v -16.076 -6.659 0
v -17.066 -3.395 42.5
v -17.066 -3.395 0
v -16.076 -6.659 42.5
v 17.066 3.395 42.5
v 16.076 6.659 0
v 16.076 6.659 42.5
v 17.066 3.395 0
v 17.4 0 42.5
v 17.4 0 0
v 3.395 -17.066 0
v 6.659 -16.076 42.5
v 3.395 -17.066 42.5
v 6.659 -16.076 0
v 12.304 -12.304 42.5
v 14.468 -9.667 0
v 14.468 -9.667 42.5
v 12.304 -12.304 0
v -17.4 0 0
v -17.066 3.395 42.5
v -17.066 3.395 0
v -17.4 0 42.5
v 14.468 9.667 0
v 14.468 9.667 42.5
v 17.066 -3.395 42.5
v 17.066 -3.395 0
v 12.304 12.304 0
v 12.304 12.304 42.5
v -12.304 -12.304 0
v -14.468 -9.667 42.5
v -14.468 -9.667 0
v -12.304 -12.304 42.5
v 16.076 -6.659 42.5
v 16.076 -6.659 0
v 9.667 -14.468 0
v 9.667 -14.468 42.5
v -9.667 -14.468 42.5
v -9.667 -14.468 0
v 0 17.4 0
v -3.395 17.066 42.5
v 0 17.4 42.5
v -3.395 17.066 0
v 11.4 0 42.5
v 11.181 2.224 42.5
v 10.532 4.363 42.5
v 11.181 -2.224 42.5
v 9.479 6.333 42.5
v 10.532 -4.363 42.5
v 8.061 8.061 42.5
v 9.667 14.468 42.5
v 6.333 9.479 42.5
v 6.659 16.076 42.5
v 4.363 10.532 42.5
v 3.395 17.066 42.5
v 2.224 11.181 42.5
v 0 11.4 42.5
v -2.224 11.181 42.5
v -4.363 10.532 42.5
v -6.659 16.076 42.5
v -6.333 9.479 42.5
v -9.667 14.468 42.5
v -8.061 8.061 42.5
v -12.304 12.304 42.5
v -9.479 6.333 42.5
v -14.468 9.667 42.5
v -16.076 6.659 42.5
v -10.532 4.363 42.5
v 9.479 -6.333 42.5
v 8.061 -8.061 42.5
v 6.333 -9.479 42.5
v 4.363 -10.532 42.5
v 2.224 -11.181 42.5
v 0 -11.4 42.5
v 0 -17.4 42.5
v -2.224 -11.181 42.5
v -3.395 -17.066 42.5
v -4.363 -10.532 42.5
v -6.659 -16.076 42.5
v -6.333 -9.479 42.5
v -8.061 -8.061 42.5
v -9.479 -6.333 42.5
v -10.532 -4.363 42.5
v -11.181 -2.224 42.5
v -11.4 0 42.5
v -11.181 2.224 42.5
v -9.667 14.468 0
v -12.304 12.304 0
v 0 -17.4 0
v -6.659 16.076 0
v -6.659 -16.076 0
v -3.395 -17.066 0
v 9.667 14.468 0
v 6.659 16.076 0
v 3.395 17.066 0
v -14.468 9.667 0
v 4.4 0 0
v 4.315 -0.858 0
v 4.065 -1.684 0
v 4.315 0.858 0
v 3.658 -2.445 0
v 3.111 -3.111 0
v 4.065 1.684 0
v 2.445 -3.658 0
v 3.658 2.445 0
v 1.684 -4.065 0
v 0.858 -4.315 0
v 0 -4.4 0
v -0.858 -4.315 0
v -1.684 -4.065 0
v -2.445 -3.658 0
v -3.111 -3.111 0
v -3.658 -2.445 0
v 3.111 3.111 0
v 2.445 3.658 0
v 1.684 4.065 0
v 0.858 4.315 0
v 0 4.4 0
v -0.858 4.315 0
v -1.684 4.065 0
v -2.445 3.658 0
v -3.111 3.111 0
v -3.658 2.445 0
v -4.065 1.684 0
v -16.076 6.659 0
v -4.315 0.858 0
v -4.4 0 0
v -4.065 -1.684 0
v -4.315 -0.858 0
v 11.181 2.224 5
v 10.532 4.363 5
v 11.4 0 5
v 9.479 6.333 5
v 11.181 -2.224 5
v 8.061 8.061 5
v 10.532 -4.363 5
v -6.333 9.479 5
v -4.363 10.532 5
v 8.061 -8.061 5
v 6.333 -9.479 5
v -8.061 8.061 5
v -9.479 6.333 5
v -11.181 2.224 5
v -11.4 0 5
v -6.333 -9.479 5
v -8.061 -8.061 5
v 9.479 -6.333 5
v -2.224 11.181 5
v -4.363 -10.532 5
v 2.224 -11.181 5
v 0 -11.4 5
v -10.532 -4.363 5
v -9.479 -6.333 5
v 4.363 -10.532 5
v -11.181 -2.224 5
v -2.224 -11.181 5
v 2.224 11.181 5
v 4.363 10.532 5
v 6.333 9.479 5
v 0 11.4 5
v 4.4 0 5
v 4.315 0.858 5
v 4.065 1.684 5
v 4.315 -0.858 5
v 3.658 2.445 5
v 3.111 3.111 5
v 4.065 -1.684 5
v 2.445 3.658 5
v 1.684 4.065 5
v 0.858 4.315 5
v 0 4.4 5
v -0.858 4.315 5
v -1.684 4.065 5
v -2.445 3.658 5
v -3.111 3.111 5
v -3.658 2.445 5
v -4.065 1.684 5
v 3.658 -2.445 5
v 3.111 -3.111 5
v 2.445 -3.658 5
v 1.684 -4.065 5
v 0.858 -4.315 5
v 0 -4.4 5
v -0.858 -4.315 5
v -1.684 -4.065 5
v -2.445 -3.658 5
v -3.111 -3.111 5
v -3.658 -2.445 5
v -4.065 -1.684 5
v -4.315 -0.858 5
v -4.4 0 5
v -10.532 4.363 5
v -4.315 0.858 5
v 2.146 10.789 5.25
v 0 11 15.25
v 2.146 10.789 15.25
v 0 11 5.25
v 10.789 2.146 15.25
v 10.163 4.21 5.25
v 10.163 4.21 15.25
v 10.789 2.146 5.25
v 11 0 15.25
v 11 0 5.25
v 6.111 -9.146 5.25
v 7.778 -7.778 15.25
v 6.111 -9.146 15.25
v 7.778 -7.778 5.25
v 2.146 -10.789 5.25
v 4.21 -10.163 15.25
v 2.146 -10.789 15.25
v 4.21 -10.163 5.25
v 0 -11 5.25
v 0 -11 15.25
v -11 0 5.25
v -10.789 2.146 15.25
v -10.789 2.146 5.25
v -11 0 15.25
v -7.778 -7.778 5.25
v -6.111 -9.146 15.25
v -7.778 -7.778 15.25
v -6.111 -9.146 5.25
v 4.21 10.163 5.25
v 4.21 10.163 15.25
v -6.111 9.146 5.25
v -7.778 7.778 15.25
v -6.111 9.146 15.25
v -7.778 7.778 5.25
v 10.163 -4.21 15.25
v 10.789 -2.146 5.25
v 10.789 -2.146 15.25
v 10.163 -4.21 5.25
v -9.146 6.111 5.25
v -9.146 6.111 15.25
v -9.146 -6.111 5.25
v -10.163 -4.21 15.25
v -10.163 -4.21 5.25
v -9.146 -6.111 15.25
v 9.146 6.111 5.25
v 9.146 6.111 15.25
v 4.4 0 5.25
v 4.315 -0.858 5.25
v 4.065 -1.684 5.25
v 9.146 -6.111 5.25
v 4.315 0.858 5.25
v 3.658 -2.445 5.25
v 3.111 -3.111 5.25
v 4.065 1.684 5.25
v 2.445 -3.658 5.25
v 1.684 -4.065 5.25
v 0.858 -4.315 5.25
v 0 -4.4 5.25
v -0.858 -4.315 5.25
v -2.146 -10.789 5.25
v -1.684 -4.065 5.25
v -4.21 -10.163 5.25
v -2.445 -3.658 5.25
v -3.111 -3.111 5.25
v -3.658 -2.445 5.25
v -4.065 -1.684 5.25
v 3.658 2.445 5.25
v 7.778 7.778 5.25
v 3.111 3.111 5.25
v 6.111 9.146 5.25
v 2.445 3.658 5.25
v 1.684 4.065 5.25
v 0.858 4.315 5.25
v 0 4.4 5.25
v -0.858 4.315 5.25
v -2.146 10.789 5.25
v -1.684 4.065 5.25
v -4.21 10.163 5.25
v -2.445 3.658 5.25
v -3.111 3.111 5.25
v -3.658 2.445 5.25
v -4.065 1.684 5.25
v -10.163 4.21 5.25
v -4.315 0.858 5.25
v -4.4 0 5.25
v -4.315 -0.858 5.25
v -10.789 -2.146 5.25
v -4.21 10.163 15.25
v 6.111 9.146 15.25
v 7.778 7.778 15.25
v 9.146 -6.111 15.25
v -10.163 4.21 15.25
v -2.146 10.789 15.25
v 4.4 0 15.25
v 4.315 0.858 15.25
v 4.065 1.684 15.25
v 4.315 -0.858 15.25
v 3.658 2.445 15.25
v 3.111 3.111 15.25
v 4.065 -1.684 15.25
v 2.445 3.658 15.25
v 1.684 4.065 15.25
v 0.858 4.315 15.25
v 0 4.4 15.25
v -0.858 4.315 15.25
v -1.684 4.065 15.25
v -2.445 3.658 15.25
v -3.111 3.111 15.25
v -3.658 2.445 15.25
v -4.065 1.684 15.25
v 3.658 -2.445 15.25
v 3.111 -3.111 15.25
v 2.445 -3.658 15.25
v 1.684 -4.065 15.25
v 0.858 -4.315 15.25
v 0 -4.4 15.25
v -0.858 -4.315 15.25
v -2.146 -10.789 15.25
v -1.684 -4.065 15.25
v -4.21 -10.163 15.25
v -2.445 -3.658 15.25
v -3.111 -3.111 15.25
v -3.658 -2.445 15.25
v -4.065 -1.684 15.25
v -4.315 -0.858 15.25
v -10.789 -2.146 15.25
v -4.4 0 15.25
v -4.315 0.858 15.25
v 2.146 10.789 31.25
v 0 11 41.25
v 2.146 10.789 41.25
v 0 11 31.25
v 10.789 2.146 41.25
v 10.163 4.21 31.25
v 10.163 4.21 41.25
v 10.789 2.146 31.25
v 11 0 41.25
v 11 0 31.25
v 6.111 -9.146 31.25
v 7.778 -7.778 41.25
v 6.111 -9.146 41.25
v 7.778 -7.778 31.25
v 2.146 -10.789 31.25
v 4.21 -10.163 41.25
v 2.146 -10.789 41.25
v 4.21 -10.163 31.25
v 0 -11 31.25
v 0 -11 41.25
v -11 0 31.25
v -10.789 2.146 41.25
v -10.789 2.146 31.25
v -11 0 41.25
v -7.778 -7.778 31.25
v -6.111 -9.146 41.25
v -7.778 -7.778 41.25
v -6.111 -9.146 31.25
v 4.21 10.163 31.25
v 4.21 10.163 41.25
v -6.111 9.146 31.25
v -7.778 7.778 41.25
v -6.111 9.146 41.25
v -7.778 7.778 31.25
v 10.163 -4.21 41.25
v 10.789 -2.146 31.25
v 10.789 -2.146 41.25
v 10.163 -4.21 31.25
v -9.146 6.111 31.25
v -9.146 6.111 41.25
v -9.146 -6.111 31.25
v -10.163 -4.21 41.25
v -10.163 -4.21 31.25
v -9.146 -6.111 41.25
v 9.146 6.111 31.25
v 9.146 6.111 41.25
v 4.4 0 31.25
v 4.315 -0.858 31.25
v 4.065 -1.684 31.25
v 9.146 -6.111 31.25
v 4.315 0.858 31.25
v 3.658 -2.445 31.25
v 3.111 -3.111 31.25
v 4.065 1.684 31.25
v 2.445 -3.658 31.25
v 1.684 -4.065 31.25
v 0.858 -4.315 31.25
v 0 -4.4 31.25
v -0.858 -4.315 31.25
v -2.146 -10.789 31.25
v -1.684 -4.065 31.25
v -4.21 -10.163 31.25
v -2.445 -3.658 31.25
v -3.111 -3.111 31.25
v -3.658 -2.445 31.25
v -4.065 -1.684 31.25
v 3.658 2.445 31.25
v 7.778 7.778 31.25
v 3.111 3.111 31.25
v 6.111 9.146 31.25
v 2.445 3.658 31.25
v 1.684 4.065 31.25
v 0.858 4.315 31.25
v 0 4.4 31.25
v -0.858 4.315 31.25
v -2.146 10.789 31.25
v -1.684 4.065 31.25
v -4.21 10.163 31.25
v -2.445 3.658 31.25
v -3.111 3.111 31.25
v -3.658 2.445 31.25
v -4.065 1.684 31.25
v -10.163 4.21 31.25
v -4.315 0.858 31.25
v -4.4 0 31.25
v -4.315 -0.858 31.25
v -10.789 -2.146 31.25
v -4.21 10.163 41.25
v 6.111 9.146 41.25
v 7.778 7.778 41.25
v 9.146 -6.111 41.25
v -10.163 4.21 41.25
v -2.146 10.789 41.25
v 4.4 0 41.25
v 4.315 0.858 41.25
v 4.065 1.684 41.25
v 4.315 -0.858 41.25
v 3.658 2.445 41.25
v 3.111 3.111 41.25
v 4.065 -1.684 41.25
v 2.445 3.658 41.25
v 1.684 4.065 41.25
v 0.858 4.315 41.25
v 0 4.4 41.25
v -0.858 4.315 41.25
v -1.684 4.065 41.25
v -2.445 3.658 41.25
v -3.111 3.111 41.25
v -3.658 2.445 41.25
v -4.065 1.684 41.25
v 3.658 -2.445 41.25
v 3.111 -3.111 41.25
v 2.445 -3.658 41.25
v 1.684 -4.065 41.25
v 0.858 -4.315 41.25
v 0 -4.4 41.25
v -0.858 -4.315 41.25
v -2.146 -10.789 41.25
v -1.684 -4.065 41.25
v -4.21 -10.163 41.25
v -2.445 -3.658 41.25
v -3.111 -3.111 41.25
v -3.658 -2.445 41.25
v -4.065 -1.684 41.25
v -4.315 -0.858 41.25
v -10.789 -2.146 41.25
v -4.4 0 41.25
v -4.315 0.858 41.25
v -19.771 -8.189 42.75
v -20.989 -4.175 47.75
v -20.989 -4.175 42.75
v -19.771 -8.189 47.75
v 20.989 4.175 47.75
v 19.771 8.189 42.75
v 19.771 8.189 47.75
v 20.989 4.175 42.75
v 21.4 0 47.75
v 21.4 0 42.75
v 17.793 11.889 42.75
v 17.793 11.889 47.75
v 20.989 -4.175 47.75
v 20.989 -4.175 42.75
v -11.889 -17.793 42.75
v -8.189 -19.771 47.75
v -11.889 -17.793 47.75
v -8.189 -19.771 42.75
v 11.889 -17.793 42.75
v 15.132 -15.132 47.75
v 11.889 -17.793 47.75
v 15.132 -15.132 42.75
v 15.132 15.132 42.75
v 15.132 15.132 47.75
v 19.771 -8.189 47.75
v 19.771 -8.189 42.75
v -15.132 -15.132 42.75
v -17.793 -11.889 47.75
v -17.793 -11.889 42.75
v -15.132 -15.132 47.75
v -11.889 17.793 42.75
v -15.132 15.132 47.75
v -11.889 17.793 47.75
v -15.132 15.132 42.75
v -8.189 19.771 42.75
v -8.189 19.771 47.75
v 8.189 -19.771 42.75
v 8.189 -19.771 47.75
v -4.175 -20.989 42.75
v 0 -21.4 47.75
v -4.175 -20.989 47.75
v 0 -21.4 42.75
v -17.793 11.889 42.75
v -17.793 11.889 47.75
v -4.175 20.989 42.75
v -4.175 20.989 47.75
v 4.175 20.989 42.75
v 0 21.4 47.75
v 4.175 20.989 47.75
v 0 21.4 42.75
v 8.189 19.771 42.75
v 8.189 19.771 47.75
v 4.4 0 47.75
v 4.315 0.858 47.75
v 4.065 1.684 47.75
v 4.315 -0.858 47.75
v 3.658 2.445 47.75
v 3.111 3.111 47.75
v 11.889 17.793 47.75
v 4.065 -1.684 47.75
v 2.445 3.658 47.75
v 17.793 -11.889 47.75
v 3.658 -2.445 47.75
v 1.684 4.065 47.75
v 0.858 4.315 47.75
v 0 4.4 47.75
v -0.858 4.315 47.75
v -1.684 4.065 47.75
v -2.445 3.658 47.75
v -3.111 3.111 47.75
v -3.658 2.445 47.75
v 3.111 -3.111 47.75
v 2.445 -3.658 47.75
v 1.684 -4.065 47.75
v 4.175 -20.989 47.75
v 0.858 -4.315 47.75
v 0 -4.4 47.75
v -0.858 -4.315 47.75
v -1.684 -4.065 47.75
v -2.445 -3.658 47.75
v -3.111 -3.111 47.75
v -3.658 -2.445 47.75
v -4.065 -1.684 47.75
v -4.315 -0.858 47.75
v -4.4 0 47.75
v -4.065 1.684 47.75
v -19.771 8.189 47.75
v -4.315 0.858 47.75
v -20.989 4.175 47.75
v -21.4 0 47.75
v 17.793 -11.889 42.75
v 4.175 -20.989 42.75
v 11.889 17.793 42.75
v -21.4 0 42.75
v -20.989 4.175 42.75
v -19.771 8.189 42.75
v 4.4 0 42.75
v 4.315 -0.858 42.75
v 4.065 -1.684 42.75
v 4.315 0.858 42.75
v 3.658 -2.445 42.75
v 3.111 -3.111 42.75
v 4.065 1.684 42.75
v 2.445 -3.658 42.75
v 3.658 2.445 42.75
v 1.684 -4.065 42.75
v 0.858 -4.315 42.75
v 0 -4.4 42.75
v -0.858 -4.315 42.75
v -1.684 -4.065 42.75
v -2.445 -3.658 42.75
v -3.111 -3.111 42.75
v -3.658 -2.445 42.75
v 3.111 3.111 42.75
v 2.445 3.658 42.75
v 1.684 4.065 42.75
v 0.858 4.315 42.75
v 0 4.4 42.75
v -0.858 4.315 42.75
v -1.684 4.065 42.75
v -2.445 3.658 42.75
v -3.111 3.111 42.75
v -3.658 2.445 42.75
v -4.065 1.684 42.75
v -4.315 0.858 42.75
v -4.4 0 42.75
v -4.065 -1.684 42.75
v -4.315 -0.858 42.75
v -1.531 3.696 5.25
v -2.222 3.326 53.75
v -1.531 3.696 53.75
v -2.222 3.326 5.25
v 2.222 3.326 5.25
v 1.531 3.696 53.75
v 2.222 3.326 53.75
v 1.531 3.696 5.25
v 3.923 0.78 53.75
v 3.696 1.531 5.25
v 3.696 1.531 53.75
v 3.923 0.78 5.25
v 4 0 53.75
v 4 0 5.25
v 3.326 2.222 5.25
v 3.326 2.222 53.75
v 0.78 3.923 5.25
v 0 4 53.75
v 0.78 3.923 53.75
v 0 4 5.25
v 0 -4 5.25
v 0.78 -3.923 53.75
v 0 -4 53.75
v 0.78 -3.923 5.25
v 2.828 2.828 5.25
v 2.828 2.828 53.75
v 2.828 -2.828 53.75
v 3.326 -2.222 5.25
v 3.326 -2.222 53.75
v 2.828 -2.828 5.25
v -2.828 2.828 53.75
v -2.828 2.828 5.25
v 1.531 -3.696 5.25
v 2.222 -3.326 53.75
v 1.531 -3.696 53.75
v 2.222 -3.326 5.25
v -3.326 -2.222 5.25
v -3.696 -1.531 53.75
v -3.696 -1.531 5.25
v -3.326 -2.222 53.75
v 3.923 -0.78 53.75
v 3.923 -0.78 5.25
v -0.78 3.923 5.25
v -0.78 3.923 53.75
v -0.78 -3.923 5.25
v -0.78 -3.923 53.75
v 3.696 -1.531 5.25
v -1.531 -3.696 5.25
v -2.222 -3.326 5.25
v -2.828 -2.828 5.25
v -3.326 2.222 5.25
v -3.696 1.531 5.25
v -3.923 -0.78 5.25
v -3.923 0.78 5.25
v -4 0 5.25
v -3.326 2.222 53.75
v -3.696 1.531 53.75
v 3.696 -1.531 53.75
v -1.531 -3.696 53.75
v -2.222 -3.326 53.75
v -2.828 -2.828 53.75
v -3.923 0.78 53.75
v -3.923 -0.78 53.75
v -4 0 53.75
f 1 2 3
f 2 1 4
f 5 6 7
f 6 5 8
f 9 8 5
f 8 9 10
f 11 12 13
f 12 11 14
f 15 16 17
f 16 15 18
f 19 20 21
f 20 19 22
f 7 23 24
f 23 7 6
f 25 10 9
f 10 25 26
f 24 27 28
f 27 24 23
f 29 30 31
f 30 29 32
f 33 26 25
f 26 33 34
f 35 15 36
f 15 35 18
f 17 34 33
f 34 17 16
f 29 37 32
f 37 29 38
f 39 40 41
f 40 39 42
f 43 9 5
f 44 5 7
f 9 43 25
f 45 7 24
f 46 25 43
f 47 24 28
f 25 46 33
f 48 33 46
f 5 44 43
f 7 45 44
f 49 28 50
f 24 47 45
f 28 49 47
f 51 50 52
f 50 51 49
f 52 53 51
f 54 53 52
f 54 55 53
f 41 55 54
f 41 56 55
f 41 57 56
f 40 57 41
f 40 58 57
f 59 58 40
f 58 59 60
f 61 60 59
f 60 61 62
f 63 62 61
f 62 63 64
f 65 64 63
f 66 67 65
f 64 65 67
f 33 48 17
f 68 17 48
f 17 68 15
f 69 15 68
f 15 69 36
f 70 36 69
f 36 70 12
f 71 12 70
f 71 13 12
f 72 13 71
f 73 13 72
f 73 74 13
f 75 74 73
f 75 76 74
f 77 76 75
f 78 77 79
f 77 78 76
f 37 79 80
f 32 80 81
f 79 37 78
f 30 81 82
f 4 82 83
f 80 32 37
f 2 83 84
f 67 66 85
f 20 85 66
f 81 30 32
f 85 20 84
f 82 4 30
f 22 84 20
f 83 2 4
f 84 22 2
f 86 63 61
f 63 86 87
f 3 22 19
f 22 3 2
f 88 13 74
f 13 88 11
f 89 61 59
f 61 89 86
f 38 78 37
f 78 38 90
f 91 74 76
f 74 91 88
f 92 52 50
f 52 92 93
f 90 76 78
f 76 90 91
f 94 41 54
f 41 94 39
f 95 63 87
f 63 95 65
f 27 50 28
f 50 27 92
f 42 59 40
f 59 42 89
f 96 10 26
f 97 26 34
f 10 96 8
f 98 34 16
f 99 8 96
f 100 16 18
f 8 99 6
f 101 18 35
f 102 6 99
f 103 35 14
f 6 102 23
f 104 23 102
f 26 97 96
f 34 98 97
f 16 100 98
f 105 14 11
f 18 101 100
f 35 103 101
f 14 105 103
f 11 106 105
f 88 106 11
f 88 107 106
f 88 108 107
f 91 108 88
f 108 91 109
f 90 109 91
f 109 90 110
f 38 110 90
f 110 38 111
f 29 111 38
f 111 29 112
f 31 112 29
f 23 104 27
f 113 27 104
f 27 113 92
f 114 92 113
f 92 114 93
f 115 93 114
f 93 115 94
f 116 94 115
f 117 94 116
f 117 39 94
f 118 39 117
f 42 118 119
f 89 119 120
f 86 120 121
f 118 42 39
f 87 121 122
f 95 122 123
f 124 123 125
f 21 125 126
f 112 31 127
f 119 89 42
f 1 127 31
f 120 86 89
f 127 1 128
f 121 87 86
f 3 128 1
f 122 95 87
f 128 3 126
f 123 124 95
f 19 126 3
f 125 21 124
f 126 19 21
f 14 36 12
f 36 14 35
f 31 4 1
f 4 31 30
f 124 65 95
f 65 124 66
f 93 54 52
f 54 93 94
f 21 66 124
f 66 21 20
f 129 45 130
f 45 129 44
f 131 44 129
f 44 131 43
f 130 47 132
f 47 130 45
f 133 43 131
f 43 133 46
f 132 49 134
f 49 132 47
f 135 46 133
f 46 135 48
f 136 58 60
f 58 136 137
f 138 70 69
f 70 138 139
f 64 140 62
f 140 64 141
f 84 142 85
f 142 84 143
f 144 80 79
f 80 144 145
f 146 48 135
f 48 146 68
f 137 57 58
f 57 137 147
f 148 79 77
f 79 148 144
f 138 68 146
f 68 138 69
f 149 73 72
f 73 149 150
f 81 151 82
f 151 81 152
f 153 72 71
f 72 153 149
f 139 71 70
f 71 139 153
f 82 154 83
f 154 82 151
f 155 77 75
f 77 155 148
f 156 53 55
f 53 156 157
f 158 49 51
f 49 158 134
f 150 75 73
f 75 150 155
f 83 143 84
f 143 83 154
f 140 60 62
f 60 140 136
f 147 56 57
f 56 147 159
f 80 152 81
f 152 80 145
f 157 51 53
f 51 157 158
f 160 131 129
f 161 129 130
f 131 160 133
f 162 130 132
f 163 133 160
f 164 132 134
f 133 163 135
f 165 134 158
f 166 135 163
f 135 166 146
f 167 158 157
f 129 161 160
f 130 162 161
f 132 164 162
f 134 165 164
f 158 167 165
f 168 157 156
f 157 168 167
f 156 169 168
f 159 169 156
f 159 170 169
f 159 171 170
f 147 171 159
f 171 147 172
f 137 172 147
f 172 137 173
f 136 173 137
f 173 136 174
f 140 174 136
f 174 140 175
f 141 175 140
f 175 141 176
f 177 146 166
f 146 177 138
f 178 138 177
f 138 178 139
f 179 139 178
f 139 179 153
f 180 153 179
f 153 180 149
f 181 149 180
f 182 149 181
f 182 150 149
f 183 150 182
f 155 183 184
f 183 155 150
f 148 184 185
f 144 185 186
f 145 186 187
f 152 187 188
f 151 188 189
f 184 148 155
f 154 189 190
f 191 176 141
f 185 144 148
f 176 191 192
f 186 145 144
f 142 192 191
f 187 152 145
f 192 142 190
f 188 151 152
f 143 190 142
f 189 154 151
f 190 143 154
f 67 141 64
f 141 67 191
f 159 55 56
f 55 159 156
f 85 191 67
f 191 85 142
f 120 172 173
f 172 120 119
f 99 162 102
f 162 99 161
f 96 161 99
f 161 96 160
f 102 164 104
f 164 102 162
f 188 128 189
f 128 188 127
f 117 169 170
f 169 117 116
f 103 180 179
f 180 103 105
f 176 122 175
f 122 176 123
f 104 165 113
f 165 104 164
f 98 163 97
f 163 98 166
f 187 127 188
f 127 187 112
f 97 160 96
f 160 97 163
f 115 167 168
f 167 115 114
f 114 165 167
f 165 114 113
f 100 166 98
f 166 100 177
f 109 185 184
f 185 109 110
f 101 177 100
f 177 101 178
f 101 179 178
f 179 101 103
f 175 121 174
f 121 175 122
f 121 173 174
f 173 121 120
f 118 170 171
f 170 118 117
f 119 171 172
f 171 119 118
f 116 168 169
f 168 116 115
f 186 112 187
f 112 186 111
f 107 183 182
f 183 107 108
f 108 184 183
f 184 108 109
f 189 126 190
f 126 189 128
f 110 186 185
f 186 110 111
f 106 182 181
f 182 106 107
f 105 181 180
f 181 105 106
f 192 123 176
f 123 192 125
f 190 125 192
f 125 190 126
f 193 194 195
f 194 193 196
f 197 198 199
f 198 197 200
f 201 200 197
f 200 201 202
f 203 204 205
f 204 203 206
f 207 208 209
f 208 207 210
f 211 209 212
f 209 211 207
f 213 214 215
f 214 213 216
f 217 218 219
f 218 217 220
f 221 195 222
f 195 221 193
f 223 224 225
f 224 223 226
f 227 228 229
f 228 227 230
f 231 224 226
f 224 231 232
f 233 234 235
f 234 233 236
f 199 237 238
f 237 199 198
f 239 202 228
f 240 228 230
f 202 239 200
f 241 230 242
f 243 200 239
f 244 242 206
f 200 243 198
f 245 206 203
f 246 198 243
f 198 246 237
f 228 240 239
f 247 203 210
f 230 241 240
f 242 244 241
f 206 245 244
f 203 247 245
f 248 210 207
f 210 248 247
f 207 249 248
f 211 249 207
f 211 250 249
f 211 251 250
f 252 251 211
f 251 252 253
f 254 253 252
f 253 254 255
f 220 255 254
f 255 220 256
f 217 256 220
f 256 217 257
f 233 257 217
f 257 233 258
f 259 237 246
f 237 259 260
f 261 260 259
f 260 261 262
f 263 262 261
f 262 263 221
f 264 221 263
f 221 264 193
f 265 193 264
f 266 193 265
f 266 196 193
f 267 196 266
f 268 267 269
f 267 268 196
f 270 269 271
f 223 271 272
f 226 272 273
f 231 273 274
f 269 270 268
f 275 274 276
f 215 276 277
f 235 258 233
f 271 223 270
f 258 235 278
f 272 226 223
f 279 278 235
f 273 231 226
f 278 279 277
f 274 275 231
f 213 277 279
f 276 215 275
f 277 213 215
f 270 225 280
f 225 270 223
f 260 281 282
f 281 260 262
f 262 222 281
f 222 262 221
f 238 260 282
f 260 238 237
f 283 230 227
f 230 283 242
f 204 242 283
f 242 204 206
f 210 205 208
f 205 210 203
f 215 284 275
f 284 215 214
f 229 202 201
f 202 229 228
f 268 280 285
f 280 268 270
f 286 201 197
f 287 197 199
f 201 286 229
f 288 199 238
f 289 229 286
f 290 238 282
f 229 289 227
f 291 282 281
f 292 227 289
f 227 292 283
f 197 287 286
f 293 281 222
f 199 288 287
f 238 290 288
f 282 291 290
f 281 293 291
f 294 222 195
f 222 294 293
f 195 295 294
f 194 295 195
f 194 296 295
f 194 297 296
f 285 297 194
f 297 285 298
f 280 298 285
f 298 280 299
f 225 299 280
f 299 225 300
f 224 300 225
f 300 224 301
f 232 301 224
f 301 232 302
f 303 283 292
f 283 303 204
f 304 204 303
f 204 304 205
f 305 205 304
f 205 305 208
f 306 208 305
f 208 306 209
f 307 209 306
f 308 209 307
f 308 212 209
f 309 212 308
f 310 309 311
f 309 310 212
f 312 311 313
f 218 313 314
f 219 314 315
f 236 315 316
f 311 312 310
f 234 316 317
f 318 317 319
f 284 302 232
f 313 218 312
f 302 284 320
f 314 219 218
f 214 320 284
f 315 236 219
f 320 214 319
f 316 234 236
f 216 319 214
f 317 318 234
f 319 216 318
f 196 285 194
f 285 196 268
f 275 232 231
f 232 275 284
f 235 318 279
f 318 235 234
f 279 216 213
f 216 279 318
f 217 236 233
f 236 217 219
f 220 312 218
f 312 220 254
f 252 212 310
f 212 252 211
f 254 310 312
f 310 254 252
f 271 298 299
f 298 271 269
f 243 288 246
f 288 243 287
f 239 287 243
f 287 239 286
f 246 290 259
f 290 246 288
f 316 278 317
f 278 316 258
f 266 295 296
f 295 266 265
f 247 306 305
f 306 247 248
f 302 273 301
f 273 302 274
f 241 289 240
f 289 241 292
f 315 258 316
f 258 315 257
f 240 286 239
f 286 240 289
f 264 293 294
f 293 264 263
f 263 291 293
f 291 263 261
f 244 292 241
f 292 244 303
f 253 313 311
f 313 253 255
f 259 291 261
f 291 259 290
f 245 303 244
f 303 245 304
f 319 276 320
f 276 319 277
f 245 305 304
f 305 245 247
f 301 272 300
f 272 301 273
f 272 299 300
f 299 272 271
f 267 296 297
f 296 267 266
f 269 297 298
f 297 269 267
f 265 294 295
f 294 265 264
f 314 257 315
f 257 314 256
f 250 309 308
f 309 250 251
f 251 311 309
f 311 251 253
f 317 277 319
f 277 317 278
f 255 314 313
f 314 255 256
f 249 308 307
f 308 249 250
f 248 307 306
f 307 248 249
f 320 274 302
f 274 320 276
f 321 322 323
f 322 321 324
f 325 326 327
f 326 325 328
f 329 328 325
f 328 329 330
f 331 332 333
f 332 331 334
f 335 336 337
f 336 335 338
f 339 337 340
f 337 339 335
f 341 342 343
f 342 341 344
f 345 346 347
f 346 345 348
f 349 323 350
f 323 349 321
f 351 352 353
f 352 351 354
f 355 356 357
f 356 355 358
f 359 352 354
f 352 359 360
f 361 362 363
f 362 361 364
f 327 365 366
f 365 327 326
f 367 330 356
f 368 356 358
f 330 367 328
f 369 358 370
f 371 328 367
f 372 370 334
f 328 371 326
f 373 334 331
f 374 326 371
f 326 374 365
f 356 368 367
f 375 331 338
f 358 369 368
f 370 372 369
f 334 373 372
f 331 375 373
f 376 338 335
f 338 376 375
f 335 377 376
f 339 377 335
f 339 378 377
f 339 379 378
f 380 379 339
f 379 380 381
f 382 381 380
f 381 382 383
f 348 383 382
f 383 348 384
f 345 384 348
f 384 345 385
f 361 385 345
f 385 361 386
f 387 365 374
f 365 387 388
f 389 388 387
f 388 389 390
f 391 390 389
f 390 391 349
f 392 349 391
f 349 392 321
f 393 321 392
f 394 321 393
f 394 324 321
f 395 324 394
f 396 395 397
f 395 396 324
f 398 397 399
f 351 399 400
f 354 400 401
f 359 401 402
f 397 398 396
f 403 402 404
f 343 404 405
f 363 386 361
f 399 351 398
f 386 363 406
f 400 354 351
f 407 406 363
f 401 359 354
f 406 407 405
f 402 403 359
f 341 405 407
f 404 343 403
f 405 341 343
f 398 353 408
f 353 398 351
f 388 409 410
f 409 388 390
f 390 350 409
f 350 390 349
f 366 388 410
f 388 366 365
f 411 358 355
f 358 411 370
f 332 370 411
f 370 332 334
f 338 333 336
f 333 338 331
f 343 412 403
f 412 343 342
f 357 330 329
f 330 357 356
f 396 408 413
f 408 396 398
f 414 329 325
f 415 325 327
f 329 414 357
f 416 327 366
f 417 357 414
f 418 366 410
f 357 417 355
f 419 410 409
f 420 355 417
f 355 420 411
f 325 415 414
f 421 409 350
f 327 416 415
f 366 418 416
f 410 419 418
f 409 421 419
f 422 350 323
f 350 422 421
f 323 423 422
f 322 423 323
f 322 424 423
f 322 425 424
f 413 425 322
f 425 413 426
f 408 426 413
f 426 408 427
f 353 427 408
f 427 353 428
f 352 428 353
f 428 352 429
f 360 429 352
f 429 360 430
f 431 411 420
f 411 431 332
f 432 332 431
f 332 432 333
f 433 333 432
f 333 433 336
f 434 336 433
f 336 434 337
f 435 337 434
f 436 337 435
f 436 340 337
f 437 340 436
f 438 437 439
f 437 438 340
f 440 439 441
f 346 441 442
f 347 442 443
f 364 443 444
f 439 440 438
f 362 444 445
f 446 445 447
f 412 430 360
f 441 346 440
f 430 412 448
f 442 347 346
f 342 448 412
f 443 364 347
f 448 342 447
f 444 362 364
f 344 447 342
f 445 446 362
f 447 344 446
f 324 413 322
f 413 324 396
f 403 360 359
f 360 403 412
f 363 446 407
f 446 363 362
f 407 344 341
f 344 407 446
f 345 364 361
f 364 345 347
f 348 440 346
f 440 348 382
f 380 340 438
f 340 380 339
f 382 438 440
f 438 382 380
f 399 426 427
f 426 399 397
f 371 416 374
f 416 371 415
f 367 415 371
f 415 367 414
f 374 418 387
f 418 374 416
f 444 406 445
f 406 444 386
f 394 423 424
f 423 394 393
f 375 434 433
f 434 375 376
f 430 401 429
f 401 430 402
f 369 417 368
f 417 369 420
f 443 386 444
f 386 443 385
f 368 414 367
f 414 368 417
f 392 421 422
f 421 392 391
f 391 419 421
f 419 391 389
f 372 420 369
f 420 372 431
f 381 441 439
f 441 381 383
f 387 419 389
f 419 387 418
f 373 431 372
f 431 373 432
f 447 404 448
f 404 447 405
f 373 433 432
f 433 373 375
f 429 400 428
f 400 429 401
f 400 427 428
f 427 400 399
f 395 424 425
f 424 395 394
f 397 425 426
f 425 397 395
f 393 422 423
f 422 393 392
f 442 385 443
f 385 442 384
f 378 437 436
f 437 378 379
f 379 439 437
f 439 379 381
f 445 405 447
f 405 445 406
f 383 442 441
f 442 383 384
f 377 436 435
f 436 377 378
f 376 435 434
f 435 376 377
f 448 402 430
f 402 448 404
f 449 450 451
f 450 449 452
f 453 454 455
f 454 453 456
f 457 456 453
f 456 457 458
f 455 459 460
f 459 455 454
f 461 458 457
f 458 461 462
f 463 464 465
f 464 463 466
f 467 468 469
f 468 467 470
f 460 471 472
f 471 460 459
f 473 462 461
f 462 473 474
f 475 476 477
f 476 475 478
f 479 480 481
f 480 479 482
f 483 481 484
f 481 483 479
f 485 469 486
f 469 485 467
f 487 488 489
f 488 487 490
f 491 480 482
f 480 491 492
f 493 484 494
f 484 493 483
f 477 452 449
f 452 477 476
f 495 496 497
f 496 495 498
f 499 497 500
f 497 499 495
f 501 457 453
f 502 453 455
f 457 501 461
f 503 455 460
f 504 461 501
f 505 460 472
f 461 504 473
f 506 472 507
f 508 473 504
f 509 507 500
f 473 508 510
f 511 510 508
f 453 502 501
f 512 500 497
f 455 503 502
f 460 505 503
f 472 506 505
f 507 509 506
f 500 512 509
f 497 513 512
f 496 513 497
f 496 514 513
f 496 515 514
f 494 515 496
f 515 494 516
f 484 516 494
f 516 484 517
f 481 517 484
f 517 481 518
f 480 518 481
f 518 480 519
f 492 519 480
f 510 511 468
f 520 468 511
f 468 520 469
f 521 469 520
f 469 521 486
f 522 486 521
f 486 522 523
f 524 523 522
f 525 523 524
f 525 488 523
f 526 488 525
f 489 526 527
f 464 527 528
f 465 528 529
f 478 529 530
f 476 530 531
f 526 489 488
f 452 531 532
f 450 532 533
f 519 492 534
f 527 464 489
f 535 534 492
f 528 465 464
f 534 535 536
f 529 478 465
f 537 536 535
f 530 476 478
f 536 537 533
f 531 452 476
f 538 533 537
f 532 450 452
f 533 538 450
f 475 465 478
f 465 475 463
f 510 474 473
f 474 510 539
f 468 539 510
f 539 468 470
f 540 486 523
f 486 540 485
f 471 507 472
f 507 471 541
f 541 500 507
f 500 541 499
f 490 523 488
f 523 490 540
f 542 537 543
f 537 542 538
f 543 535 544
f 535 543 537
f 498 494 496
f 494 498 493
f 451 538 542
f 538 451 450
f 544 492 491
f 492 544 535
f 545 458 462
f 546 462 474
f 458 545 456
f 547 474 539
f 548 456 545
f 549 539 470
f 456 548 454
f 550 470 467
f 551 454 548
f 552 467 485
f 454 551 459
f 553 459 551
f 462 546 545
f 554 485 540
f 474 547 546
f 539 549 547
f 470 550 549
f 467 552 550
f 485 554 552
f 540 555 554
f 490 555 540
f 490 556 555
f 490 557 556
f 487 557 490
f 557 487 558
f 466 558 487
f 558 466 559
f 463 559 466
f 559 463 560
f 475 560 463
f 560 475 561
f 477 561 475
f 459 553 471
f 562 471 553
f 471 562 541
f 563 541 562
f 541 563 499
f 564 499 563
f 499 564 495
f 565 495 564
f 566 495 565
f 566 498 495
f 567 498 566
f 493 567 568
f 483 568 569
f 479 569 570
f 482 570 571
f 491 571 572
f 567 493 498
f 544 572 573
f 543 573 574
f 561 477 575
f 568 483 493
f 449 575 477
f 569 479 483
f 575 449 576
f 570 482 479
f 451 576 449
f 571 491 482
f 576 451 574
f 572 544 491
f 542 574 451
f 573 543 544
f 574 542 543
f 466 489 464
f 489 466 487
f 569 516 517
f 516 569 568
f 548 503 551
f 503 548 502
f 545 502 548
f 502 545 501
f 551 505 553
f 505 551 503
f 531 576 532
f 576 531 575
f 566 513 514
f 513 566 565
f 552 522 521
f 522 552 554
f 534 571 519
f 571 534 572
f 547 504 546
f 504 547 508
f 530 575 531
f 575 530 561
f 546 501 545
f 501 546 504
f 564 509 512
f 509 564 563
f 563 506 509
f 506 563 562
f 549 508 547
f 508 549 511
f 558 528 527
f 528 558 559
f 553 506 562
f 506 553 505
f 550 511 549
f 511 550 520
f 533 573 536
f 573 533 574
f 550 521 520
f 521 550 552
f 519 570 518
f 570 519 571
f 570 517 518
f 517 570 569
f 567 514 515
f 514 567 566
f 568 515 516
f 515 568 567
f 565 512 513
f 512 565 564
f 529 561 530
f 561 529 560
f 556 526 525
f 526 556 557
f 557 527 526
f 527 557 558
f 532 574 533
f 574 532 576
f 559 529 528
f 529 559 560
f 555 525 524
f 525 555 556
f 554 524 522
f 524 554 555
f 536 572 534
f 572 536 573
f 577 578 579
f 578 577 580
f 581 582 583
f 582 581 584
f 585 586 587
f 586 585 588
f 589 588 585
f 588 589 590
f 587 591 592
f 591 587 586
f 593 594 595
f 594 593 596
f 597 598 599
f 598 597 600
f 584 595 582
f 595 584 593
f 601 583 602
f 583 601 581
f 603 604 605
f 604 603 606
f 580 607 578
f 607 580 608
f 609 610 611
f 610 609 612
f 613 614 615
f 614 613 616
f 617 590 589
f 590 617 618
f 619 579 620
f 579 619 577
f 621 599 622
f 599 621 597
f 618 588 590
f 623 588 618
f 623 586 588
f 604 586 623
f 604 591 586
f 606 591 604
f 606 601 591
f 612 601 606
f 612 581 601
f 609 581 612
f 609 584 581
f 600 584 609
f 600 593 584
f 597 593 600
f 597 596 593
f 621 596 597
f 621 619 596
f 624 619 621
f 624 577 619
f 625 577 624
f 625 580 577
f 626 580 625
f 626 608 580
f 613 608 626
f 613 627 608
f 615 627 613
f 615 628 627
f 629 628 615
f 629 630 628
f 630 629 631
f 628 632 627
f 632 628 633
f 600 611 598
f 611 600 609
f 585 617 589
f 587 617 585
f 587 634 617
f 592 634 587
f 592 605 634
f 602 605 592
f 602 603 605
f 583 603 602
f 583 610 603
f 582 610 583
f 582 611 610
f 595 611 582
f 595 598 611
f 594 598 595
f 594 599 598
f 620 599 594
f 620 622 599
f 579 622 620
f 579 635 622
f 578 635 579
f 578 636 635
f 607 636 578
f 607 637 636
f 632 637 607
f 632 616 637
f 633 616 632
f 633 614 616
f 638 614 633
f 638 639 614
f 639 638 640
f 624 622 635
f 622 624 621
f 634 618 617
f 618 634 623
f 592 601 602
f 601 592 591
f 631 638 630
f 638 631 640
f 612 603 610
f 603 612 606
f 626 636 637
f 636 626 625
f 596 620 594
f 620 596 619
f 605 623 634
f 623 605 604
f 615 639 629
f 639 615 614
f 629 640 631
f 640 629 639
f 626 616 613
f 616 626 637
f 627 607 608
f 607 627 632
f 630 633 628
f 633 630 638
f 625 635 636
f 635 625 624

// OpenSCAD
$fn = 32;

// ------------------------------------------------------------------------
// Shaft station: cup d34.8 x 42.5 mm, shaft d8
// Every part is its own module, assembly() places every instance.
// ------------------------------------------------------------------------

// --- part 1 ---
module housing_cup() {
  difference() {
    cylinder(h = 42.5, d = 34.8);
    translate([0, 0, 5]) cylinder(h = 38.5, d = 22.8);
    translate([0, 0, -1]) cylinder(h = 7, d = 8.8);
  }
}

// --- part 2 ---
module bearing_lower() {
  difference() {
      translate([0, 0, 0]) cylinder(h = 10, d = 22);
      translate([0, 0, -1]) cylinder(h = 12, d = 8.8);
    }
}

// --- part 3 ---
module bearing_upper() {
  difference() {
      translate([0, 0, 0]) cylinder(h = 10, d = 22);
      translate([0, 0, -1]) cylinder(h = 12, d = 8.8);
    }
}

// --- part 4 ---
module station_shaft() {
  translate([0, 0, -24.25]) cylinder(h = 48.5, d = 8);
}

// --- part 5 ---
module station_cover() {
  difference() {
    cylinder(h = 5, d = 42.8);
    translate([0, 0, -1]) cylinder(h = 7, d = 8.8);
  }
}

// --- assembly ---
module assembly() {
  color([0.80, 0.24, 0.20]) translate([0, 0, 0]) rotate([0, 0, 0]) housing_cup();
  color([0.20, 0.45, 0.75]) translate([0, 0, 5.25]) rotate([0, 0, 0]) bearing_lower();
  color([0.25, 0.62, 0.32]) translate([0, 0, 31.25]) rotate([0, 0, 0]) bearing_upper();
  color([0.92, 0.70, 0.18]) translate([0, 0, 29.5]) rotate([0, 0, 0]) station_shaft();
  color([0.58, 0.35, 0.70]) translate([0, 0, 42.75]) rotate([0, 0, 0]) station_cover();
}

assembly();
